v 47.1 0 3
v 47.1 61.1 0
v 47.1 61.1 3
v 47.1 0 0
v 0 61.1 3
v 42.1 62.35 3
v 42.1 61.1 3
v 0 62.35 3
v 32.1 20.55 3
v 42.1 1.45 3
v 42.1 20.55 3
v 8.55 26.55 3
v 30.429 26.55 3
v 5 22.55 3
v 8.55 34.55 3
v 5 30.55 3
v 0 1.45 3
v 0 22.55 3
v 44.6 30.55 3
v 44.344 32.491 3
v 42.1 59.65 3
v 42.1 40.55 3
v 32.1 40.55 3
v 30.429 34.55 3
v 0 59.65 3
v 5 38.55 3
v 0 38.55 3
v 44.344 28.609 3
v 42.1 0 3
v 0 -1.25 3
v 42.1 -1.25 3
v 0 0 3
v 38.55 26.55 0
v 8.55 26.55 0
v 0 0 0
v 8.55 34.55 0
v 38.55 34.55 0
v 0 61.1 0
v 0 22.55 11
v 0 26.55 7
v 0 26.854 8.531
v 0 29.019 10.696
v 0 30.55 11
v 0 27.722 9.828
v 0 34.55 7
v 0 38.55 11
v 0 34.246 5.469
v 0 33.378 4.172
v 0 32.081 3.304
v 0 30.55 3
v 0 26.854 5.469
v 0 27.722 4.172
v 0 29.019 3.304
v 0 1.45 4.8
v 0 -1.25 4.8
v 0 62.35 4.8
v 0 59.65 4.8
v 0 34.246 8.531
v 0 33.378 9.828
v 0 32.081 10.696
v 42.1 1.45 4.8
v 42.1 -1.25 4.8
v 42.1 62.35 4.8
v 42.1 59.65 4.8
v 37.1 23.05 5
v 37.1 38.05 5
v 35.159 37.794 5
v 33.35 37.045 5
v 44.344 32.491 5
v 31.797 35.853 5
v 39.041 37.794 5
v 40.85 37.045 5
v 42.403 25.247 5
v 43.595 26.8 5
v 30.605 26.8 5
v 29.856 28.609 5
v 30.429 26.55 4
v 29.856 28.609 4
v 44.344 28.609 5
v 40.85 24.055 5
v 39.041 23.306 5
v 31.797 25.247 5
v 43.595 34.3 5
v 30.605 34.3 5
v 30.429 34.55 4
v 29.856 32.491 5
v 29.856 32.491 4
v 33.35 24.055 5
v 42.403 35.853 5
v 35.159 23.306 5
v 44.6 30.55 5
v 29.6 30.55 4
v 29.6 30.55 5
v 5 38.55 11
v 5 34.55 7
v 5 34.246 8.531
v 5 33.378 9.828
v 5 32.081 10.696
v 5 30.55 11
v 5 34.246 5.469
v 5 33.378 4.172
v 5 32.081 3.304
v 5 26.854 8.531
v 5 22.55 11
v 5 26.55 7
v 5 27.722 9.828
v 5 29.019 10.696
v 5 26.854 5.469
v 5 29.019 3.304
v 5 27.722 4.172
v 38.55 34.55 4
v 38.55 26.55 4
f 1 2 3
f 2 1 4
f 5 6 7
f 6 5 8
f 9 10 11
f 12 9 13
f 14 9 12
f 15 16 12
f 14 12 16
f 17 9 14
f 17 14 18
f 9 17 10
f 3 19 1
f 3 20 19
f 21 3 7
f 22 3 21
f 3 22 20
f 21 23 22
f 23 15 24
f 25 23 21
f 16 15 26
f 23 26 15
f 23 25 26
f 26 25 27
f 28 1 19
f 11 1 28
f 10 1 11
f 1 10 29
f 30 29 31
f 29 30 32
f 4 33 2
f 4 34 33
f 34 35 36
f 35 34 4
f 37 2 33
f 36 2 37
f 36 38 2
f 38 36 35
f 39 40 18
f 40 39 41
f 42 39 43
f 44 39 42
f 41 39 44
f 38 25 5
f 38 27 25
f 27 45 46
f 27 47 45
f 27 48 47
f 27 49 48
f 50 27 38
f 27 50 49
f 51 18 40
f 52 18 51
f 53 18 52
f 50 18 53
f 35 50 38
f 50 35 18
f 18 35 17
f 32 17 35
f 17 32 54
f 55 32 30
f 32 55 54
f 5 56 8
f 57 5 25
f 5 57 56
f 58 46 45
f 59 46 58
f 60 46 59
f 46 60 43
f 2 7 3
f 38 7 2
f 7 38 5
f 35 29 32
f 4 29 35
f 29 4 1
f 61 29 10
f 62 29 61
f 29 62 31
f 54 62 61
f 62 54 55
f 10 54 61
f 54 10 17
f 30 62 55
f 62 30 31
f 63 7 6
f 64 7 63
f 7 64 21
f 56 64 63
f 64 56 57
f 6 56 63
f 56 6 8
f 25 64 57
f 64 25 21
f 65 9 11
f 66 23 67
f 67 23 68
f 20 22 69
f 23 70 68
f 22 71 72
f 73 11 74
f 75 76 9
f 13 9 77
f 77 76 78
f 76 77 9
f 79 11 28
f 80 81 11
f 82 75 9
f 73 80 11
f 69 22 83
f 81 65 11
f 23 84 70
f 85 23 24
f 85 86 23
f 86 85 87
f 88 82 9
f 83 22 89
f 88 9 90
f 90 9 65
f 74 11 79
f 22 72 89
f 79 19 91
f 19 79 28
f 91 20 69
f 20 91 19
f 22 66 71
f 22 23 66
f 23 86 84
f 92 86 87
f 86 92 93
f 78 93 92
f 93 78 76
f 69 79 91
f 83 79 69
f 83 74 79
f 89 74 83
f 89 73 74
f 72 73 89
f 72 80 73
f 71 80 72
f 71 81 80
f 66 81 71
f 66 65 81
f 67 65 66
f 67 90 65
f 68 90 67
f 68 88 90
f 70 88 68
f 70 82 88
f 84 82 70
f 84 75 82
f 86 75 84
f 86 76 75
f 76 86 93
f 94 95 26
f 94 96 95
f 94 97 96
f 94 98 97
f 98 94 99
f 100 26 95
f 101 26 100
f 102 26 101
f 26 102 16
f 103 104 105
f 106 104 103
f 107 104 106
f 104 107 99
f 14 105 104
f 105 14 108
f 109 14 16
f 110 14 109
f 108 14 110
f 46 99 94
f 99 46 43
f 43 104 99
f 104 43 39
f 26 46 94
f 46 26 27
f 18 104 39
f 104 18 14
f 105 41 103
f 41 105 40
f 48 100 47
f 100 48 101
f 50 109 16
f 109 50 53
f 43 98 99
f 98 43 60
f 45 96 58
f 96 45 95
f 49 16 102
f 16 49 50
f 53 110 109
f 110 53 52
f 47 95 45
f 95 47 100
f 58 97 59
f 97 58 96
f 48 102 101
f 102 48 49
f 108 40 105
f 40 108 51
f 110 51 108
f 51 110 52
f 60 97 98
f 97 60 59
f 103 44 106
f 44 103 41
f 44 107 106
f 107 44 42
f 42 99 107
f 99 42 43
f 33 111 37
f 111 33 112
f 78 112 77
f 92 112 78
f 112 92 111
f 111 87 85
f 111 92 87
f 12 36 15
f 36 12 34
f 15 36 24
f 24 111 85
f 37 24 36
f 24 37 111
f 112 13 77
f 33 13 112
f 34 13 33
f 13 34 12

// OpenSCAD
// Simple Cam-Lock Sliding Lid Box for MG996R Servo
// SafeCrackerArduino Reaction Time Game
// No gravity assist - pure cam mechanism

// MG996R dimensions
servo_length = 40;
servo_width = 20;
servo_height = 40.5;
servo_mount_width = 55;

// Box parameters
wall = 2.5;
clearance = 0.5;
base_thickness = 3;
size_increase = 1.1; // 10% increase factor

// Sliding mechanism
slide_groove_depth = 2;
slide_groove_width = 3;
lid_thickness = 3;

// Cam parameters
cam_diameter = 30;
cam_thickness = 5;
cam_flat_width = 20; // Width of flat edge for locking

// Calculate box dimensions with 10% increase
box_inner_l = (servo_length + 2 * clearance) * size_increase;
box_inner_w = (servo_mount_width + 2 * clearance) * size_increase;
box_inner_h = (servo_height + clearance) * size_increase;
box_outer_l = box_inner_l + 2 * wall;
box_outer_w = box_inner_w + 2 * wall;
box_outer_h = box_inner_h + base_thickness;

// Main box
module box() {
    difference() {
        // Outer shell
        cube([box_outer_l, box_outer_w, box_outer_h]);
        
        // Inner cavity
        translate([wall, wall, base_thickness])
            cube([box_inner_l, box_inner_w, box_inner_h + 10]);
        
        // Servo shaft hole - large for easy assembly
        translate([box_outer_l/2, box_outer_w/2, -1])
            cylinder(h=base_thickness + 2, d=12, $fn=24);
        
        // Cable exit
        translate([box_outer_l - wall - 1, box_outer_w/2 - 5, base_thickness + 15])
            cube([wall + 2, 10, 10]);
        
        // Slide grooves for lid
        groove_height = box_outer_h - 8;
        // Left groove
        translate([-1, wall - slide_groove_width/2, groove_height])
            cube([box_outer_l + 2, slide_groove_width, slide_groove_depth + 1]);
        // Right groove
        translate([-1, box_outer_w - wall - slide_groove_width/2, groove_height])
            cube([box_outer_l + 2, slide_groove_width, slide_groove_depth + 1]);
        
        // Front opening for lid
        translate([-1, wall - slide_groove_width/2, groove_height])
            cube([wall + 2, box_inner_w + slide_groove_width + 1, 10]);
        
        // Mounting holes
        for(x=[8, box_outer_l - 8]) {
            for(y=[8, box_outer_w - 8]) {
                translate([x, y, -1]) {
                    cylinder(h=base_thickness + 2, d=3.2, $fn=16);
                    // Countersink
                    cylinder(h=2, d1=6, d2=3.2, $fn=16);
                }
            }
        }
    }
    
    // Servo mounting features
    translate([wall, wall, base_thickness])
        simple_servo_mounts();
}

// Simple servo mounting
module simple_servo_mounts() {
    // Adjusted for 10% larger cavity
    servo_y = (box_inner_w - servo_width * size_increase) / 2;
    
    // Side brackets
    translate([0, servo_y - 2, 0])
        cube([box_inner_l, 2, 15]);
    translate([0, servo_y + servo_width * size_increase, 0])
        cube([box_inner_l, 2, 15]);
    
    // Tab supports at correct height
    tab_y = (box_inner_w - servo_mount_width * size_increase) / 2;
    translate([5, tab_y, 17])
        cube([box_inner_l - 10, 5, 2]);
    translate([5, tab_y + servo_mount_width * size_increase - 5, 17])
        cube([box_inner_l - 10, 5, 2]);
}

// Simple sliding lid
module sliding_lid() {
    lid_length = box_outer_l - wall - 0.5;
    lid_width = box_inner_w - 0.5;
    
    difference() {
        union() {
            // Main lid panel
            cube([lid_length, lid_width, lid_thickness]);
            
            // Slide rails
            rail_thickness = slide_groove_width - 0.3;
            rail_height = slide_groove_depth - 0.2;
            
            // Left rail
            translate([0, -rail_thickness/2 + 0.1, lid_thickness])
                cube([lid_length - 5, rail_thickness, rail_height]);
            // Right rail
            translate([0, lid_width - rail_thickness/2 - 0.1, lid_thickness])
                cube([lid_length - 5, rail_thickness, rail_height]);
            
            // Pull handle
            translate([lid_length - 15, lid_width/2 - 10, 0])
                hull() {
                    cube([10, 20, lid_thickness]);
                    translate([5, 10, lid_thickness])
                        cylinder(h=2, d=15, $fn=24);
                }
            
            // Cam follower block at front
            translate([0, lid_width/2 - 8, 0])
                cube([5, 16, lid_thickness + 8]);
        }
        
        // Cam contact surface (rounded for smooth operation)
        translate([2.5, lid_width/2, lid_thickness + 4])
            rotate([0, 90, 0])
                cylinder(h=6, d=8, $fn=16, center=true);
        
        // Status window
        translate([lid_length/2 - 15, lid_width/2 - 4, -1])
            cube([30, 8, lid_thickness + 2]);
        
        // Text
        translate([lid_length/2, lid_width/2, lid_thickness - 0.5])
            linear_extrude(height=1)
                text("LOCKED", size=5, halign="center", valign="center");
    }
}

// Simple D-shaped cam
module simple_cam() {
    difference() {
        // Main cam shape
        intersection() {
            cylinder(h=cam_thickness, d=cam_diameter, $fn=32);
            translate([-cam_diameter/2, -cam_diameter/2, 0])
                cube([cam_diameter, cam_diameter - cam_flat_width/2 + cam_diameter/2, cam_thickness]);
        }
        
        // Center hole for servo shaft
        translate([0, 0, -1])
            cylinder(h=cam_thickness + 2, d=6.2, $fn=24);
        
        // Set screw hole
        translate([0, 8, cam_thickness/2])
            rotate([0, 90, 0])
                cylinder(h=20, d=3, $fn=16, center=true);
        
        // Position marker line for assembly reference
        translate([-1, 0, cam_thickness - 0.5])
            cube([cam_diameter/2 + 1, 2, 0.5]);
    }
}

// Assembly view
// Box
//box();

// Lid (shown separately for printing)
//translate([0, box_outer_w + 10, 0])
    sliding_lid();

// Cam (shown separately)
//translate([box_outer_l + 20, 20, 0])
  //  simple_cam();

// Assembly instructions
echo("=== ASSEMBLY INSTRUCTIONS ===");
echo("1. Insert servo into box from top");
echo("2. Slide lid in from front (cam follower faces inward)");
echo("3. Attach cam to servo shaft with flat edge at 0°");
echo("4. Cam at 0-30°: Flat blocks lid (LOCKED)");
echo("5. Cam at 90-180°: Round edge allows sliding (UNLOCKED)");
echo("Print time: ~3.5 hours total at 0.2mm layers");
echo("Box size increased by 10% for easier servo fit");
